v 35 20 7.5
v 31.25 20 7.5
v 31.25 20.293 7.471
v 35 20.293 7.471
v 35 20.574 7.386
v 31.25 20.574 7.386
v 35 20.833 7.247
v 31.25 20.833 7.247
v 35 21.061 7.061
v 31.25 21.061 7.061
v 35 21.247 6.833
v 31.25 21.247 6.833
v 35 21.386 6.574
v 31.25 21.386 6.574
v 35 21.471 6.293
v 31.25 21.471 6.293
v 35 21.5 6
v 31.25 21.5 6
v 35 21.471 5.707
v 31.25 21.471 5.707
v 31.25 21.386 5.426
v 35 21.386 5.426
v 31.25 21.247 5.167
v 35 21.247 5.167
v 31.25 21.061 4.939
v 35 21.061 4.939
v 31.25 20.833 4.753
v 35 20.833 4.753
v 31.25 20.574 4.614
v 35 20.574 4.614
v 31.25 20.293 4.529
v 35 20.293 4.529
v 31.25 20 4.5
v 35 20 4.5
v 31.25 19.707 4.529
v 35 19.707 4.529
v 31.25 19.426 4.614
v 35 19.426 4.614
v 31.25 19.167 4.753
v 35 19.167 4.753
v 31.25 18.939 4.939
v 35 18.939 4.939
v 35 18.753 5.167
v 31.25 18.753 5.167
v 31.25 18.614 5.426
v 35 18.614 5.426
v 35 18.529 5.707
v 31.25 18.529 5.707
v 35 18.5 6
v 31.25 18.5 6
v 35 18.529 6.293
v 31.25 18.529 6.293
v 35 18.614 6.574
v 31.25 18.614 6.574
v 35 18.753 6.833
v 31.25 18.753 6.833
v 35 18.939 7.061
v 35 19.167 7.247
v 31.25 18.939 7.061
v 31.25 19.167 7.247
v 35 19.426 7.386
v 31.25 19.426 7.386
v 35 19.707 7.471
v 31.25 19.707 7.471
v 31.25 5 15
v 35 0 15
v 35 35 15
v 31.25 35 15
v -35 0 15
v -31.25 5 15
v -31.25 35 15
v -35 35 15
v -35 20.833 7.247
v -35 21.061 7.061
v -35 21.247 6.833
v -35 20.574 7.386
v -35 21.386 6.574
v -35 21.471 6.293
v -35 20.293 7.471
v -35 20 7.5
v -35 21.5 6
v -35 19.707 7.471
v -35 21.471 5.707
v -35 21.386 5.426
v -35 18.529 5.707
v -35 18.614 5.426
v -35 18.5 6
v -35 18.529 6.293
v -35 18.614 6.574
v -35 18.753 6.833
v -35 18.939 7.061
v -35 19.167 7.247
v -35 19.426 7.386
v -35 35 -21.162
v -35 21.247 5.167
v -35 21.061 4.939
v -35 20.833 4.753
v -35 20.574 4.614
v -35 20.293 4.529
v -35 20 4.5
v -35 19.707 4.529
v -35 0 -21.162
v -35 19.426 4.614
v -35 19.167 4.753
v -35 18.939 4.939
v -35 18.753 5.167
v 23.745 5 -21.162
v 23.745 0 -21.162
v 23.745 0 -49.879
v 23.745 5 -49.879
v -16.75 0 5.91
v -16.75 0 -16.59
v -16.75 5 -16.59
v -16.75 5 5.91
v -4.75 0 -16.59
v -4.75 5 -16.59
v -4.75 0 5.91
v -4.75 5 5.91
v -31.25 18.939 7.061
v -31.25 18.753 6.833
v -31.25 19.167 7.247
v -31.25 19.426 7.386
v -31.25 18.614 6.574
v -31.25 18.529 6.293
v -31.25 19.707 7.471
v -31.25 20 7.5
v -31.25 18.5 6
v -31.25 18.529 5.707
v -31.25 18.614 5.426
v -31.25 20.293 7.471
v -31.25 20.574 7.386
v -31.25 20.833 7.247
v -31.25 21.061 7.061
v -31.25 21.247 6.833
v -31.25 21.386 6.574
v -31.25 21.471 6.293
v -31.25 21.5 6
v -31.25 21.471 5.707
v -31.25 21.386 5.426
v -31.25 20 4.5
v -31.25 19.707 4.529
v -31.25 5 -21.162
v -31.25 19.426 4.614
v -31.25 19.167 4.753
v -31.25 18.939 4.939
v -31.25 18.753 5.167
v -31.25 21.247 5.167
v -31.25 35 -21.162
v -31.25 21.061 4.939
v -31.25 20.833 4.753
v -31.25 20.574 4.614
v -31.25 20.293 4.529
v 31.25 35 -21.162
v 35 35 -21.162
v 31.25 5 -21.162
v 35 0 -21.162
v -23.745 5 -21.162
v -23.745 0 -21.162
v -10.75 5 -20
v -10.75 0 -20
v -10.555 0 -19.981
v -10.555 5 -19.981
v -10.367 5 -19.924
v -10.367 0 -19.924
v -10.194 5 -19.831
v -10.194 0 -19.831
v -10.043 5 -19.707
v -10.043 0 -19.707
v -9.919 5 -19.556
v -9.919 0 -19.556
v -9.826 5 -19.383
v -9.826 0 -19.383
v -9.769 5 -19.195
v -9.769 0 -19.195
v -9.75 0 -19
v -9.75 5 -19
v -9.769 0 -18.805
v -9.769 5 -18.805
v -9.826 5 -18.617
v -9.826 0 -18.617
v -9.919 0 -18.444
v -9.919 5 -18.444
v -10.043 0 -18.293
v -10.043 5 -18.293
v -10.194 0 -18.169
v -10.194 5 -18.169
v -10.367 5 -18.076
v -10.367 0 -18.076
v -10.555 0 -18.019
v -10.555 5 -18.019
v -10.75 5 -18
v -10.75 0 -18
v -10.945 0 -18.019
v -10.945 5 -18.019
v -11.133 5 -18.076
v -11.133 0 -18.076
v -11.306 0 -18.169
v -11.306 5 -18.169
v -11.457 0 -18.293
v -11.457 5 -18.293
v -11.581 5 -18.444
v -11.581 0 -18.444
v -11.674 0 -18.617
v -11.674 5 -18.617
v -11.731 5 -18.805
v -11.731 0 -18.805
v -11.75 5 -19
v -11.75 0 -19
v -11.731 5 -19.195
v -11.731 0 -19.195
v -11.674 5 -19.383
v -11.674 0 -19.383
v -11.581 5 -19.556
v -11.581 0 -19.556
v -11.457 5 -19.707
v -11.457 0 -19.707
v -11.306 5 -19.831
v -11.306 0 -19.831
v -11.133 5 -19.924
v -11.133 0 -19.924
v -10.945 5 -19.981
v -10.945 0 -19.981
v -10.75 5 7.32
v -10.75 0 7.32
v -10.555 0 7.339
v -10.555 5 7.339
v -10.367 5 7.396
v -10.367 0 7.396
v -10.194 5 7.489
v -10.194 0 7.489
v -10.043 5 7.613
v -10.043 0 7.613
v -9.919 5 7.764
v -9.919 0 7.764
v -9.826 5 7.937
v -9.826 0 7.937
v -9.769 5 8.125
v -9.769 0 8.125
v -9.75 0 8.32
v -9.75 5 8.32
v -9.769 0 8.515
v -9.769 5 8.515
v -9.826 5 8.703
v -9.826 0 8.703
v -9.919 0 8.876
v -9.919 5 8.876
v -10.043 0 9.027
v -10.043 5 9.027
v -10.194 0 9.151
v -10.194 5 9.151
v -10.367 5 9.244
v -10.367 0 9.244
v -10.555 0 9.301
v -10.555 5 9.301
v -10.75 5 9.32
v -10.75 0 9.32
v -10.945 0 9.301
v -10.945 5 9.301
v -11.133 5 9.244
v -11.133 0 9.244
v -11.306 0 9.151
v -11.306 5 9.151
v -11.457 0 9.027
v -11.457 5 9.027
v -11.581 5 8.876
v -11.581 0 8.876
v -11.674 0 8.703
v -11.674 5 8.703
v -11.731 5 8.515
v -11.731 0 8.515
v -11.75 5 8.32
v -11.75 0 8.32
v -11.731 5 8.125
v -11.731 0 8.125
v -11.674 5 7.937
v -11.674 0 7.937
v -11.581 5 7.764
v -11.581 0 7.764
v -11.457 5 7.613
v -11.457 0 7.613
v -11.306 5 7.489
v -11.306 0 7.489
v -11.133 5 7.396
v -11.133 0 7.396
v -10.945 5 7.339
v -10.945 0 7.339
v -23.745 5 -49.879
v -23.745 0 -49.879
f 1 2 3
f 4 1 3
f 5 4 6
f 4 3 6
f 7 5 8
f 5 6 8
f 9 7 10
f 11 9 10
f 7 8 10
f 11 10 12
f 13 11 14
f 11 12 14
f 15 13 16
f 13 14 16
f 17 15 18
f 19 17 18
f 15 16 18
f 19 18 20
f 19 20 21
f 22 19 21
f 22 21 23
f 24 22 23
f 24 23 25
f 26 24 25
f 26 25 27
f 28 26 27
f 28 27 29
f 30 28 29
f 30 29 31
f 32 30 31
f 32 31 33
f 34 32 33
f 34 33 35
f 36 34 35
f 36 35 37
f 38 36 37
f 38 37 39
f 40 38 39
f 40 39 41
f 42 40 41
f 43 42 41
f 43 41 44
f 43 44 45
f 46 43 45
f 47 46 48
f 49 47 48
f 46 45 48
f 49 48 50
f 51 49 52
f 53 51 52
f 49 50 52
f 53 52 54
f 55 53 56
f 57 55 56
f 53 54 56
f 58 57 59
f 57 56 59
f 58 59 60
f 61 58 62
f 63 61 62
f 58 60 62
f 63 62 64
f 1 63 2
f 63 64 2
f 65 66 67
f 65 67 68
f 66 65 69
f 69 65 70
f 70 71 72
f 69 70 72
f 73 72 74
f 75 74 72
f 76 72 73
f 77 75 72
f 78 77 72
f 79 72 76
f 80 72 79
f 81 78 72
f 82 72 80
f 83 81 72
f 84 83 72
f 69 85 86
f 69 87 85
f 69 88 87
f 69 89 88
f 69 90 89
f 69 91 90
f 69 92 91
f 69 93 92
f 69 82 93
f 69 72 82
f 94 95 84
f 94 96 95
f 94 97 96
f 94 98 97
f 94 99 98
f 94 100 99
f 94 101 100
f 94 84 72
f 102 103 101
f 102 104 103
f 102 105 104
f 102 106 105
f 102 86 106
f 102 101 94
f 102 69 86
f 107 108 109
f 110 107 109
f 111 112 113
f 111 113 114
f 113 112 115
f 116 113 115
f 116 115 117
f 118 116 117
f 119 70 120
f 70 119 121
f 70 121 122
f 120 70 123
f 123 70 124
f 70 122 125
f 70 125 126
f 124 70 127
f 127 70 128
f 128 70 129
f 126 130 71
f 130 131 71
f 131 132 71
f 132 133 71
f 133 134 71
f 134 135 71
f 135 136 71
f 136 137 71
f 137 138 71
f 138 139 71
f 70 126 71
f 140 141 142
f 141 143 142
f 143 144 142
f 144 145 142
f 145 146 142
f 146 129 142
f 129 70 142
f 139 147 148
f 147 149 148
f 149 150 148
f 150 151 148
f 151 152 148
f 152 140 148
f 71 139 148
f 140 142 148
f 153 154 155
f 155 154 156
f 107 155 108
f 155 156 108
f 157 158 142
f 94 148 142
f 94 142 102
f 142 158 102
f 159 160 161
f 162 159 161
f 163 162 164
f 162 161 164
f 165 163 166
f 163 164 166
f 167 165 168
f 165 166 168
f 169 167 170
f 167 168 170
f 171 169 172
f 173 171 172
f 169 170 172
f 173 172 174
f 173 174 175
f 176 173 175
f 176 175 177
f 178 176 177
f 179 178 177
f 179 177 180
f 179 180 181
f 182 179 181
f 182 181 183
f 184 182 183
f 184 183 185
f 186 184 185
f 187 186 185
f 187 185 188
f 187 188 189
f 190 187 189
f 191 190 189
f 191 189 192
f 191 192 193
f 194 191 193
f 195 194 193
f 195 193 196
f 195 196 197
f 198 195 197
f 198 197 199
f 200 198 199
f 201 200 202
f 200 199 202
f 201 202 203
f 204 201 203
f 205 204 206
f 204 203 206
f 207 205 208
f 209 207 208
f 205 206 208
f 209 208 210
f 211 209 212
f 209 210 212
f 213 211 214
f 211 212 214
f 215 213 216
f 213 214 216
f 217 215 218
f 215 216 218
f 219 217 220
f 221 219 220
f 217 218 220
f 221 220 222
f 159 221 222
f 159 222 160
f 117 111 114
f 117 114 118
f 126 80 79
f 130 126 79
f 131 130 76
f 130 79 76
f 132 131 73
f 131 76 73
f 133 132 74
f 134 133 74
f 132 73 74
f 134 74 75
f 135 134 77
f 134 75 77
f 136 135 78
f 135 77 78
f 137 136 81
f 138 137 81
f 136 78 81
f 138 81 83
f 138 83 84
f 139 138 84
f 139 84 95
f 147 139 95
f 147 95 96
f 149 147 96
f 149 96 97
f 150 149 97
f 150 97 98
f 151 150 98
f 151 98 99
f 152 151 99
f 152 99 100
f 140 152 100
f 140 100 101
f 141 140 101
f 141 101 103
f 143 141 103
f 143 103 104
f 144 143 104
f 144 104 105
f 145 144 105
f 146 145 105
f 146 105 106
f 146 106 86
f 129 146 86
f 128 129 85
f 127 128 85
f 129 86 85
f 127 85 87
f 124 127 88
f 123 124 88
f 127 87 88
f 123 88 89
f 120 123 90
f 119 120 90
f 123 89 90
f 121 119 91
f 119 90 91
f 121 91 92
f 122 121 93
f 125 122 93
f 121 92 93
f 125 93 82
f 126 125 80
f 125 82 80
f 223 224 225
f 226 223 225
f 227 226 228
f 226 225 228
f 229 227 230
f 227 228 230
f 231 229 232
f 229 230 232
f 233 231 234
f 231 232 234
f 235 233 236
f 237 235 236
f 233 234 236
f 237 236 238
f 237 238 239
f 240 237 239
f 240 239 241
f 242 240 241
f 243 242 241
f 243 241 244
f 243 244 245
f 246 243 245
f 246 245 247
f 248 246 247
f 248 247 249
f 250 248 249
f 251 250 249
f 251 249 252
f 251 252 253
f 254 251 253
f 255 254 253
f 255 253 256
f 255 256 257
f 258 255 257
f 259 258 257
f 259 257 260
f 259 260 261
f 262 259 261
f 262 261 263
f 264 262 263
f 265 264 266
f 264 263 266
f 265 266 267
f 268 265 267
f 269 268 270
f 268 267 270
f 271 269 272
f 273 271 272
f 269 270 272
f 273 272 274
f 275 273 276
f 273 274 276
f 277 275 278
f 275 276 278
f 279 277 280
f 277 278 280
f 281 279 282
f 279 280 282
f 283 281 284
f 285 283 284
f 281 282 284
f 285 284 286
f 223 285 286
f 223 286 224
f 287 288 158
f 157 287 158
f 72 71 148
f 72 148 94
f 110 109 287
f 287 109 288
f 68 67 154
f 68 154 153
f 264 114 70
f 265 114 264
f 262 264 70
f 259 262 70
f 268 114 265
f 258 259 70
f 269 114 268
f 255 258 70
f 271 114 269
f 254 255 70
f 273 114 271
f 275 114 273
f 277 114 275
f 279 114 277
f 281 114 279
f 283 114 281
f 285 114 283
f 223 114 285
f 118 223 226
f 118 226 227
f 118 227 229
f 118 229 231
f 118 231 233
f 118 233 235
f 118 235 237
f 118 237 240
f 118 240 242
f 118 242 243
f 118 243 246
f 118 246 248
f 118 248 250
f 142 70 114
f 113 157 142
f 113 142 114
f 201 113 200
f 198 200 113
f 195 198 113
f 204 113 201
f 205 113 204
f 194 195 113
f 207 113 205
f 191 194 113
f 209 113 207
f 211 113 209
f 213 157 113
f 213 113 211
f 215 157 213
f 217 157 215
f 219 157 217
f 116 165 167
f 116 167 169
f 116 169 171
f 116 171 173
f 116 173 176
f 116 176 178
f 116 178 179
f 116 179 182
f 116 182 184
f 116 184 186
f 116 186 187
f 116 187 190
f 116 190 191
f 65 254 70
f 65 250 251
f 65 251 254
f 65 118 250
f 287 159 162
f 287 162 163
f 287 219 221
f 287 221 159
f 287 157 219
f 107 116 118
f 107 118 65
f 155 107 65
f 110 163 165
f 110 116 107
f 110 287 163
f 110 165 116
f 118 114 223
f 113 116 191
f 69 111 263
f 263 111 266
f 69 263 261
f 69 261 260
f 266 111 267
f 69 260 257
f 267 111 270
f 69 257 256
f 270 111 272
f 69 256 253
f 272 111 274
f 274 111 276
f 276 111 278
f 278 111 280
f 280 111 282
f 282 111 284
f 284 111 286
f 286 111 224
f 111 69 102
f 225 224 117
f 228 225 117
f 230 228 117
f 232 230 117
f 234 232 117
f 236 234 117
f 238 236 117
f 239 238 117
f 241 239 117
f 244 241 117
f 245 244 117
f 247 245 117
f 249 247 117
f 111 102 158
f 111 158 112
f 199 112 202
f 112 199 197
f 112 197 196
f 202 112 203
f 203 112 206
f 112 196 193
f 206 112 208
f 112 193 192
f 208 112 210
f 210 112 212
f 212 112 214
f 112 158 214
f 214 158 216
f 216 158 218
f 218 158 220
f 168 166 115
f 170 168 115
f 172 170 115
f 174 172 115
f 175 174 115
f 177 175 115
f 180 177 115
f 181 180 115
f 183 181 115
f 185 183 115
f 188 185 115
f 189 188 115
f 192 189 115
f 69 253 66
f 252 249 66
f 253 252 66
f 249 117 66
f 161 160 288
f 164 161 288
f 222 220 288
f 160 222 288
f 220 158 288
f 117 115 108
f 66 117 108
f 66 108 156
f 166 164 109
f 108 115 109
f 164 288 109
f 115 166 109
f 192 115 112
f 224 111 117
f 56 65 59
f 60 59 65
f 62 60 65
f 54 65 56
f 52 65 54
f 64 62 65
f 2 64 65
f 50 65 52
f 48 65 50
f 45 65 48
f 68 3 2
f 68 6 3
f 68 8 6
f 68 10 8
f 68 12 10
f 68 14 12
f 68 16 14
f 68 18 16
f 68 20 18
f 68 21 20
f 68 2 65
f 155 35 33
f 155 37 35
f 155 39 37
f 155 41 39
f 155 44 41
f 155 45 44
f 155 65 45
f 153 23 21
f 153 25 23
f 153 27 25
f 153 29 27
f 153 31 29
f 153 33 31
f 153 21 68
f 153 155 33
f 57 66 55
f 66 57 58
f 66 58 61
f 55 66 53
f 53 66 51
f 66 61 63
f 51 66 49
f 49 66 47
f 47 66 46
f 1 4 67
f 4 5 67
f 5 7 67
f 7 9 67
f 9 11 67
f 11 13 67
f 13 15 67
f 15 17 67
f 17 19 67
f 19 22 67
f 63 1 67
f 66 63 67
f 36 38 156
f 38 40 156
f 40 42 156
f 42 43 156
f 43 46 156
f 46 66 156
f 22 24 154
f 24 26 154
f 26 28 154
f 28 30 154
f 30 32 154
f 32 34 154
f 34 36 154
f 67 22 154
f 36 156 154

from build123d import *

# Parameters (mm, degrees)
SKETCH1_W           = 70
SKETCH1_H           = 150
BOSS_EXTRUDE1_DEPTH = 5
SKETCH7_W           = 3.75
SKETCH7_H           = 30
BOSS_EXTRUDE2_DEPTH = 90
SKETCH10_W          = 60
SKETCH10_H          = 5
CUT_EXTRUDE2_DEPTH  = 75
SKETCH11_R          = 1.5
CUT_EXTRUDE3_DEPTH  = 75
CUT_EXTRUDE4_DEPTH  = 40
SKETCH13_R          = 1
SKETCH13_W          = 12
SKETCH13_H          = 22.5
CUT_EXTRUDE5_DEPTH  = 35


with BuildPart() as part:
    # Sketch1 → Boss-Extrude1 (new body)
    with BuildSketch(Plane(origin=(0, 0, 0), x_dir=(1, 0, 0), z_dir=(0, 1, 0))):
        Rectangle(SKETCH1_W, SKETCH1_H)
    extrude(amount=BOSS_EXTRUDE1_DEPTH)

    # Sketch7 → Boss-Extrude2 (add)
    with BuildSketch(Plane(origin=(0, 0, -75), x_dir=(-1, 0, 0), z_dir=(0, 0, -1))):
        with Locations((-33.125, 20)):
            Rectangle(SKETCH7_W, SKETCH7_H)
        with Locations((33.125, 20)):
            Rectangle(SKETCH7_W, SKETCH7_H)
    extrude(amount=-BOSS_EXTRUDE2_DEPTH)

    # Sketch10 → Cut-Extrude2 (cut)
    with BuildSketch(Plane(origin=(35, 0, 0), x_dir=(0, 0, -1), z_dir=(1, 0, 0))):
        with Locations((-45, 2.5)):
            Rectangle(SKETCH10_W, SKETCH10_H)
    extrude(amount=-CUT_EXTRUDE2_DEPTH, mode=Mode.SUBTRACT)

    # Sketch11 → Cut-Extrude3 (cut)
    with BuildSketch(Plane.ZY.offset(35)):
        with Locations((6, 20)):
            Circle(SKETCH11_R)
    extrude(amount=-CUT_EXTRUDE3_DEPTH, mode=Mode.SUBTRACT)

    # Sketch12 → Cut-Extrude4 (cut)
    with BuildSketch(Plane.XZ):
        Polygon((35, -75), (35, -21.162236792), (23.74549434, -21.162236792), (23.74549434, -49.878747724), (0, -49.878747724), (0, -75), (23.74549434, -75), align=None)
        Polygon((0, -75), (0, -49.878747724), (-23.74549434, -49.878747724), (-23.74549434, -21.162236792), (-35, -21.162236792), (-35, -75), (-23.74549434, -75), align=None)
    extrude(amount=-CUT_EXTRUDE4_DEPTH, mode=Mode.SUBTRACT)

    # Sketch13 → Cut-Extrude5 (cut)
    with BuildSketch(Plane.XZ):
        with Locations(Location((-10.75, 8.32, 0), (0, 0, 270))):
            Circle(SKETCH13_R)
        with Locations(Location((-10.75, -19, 0), (0, 0, 270))):
            Circle(SKETCH13_R)
        with Locations((-10.75, -5.34)):
            Rectangle(SKETCH13_W, SKETCH13_H)
    extrude(amount=-CUT_EXTRUDE5_DEPTH, mode=Mode.SUBTRACT)


solid = part.part
